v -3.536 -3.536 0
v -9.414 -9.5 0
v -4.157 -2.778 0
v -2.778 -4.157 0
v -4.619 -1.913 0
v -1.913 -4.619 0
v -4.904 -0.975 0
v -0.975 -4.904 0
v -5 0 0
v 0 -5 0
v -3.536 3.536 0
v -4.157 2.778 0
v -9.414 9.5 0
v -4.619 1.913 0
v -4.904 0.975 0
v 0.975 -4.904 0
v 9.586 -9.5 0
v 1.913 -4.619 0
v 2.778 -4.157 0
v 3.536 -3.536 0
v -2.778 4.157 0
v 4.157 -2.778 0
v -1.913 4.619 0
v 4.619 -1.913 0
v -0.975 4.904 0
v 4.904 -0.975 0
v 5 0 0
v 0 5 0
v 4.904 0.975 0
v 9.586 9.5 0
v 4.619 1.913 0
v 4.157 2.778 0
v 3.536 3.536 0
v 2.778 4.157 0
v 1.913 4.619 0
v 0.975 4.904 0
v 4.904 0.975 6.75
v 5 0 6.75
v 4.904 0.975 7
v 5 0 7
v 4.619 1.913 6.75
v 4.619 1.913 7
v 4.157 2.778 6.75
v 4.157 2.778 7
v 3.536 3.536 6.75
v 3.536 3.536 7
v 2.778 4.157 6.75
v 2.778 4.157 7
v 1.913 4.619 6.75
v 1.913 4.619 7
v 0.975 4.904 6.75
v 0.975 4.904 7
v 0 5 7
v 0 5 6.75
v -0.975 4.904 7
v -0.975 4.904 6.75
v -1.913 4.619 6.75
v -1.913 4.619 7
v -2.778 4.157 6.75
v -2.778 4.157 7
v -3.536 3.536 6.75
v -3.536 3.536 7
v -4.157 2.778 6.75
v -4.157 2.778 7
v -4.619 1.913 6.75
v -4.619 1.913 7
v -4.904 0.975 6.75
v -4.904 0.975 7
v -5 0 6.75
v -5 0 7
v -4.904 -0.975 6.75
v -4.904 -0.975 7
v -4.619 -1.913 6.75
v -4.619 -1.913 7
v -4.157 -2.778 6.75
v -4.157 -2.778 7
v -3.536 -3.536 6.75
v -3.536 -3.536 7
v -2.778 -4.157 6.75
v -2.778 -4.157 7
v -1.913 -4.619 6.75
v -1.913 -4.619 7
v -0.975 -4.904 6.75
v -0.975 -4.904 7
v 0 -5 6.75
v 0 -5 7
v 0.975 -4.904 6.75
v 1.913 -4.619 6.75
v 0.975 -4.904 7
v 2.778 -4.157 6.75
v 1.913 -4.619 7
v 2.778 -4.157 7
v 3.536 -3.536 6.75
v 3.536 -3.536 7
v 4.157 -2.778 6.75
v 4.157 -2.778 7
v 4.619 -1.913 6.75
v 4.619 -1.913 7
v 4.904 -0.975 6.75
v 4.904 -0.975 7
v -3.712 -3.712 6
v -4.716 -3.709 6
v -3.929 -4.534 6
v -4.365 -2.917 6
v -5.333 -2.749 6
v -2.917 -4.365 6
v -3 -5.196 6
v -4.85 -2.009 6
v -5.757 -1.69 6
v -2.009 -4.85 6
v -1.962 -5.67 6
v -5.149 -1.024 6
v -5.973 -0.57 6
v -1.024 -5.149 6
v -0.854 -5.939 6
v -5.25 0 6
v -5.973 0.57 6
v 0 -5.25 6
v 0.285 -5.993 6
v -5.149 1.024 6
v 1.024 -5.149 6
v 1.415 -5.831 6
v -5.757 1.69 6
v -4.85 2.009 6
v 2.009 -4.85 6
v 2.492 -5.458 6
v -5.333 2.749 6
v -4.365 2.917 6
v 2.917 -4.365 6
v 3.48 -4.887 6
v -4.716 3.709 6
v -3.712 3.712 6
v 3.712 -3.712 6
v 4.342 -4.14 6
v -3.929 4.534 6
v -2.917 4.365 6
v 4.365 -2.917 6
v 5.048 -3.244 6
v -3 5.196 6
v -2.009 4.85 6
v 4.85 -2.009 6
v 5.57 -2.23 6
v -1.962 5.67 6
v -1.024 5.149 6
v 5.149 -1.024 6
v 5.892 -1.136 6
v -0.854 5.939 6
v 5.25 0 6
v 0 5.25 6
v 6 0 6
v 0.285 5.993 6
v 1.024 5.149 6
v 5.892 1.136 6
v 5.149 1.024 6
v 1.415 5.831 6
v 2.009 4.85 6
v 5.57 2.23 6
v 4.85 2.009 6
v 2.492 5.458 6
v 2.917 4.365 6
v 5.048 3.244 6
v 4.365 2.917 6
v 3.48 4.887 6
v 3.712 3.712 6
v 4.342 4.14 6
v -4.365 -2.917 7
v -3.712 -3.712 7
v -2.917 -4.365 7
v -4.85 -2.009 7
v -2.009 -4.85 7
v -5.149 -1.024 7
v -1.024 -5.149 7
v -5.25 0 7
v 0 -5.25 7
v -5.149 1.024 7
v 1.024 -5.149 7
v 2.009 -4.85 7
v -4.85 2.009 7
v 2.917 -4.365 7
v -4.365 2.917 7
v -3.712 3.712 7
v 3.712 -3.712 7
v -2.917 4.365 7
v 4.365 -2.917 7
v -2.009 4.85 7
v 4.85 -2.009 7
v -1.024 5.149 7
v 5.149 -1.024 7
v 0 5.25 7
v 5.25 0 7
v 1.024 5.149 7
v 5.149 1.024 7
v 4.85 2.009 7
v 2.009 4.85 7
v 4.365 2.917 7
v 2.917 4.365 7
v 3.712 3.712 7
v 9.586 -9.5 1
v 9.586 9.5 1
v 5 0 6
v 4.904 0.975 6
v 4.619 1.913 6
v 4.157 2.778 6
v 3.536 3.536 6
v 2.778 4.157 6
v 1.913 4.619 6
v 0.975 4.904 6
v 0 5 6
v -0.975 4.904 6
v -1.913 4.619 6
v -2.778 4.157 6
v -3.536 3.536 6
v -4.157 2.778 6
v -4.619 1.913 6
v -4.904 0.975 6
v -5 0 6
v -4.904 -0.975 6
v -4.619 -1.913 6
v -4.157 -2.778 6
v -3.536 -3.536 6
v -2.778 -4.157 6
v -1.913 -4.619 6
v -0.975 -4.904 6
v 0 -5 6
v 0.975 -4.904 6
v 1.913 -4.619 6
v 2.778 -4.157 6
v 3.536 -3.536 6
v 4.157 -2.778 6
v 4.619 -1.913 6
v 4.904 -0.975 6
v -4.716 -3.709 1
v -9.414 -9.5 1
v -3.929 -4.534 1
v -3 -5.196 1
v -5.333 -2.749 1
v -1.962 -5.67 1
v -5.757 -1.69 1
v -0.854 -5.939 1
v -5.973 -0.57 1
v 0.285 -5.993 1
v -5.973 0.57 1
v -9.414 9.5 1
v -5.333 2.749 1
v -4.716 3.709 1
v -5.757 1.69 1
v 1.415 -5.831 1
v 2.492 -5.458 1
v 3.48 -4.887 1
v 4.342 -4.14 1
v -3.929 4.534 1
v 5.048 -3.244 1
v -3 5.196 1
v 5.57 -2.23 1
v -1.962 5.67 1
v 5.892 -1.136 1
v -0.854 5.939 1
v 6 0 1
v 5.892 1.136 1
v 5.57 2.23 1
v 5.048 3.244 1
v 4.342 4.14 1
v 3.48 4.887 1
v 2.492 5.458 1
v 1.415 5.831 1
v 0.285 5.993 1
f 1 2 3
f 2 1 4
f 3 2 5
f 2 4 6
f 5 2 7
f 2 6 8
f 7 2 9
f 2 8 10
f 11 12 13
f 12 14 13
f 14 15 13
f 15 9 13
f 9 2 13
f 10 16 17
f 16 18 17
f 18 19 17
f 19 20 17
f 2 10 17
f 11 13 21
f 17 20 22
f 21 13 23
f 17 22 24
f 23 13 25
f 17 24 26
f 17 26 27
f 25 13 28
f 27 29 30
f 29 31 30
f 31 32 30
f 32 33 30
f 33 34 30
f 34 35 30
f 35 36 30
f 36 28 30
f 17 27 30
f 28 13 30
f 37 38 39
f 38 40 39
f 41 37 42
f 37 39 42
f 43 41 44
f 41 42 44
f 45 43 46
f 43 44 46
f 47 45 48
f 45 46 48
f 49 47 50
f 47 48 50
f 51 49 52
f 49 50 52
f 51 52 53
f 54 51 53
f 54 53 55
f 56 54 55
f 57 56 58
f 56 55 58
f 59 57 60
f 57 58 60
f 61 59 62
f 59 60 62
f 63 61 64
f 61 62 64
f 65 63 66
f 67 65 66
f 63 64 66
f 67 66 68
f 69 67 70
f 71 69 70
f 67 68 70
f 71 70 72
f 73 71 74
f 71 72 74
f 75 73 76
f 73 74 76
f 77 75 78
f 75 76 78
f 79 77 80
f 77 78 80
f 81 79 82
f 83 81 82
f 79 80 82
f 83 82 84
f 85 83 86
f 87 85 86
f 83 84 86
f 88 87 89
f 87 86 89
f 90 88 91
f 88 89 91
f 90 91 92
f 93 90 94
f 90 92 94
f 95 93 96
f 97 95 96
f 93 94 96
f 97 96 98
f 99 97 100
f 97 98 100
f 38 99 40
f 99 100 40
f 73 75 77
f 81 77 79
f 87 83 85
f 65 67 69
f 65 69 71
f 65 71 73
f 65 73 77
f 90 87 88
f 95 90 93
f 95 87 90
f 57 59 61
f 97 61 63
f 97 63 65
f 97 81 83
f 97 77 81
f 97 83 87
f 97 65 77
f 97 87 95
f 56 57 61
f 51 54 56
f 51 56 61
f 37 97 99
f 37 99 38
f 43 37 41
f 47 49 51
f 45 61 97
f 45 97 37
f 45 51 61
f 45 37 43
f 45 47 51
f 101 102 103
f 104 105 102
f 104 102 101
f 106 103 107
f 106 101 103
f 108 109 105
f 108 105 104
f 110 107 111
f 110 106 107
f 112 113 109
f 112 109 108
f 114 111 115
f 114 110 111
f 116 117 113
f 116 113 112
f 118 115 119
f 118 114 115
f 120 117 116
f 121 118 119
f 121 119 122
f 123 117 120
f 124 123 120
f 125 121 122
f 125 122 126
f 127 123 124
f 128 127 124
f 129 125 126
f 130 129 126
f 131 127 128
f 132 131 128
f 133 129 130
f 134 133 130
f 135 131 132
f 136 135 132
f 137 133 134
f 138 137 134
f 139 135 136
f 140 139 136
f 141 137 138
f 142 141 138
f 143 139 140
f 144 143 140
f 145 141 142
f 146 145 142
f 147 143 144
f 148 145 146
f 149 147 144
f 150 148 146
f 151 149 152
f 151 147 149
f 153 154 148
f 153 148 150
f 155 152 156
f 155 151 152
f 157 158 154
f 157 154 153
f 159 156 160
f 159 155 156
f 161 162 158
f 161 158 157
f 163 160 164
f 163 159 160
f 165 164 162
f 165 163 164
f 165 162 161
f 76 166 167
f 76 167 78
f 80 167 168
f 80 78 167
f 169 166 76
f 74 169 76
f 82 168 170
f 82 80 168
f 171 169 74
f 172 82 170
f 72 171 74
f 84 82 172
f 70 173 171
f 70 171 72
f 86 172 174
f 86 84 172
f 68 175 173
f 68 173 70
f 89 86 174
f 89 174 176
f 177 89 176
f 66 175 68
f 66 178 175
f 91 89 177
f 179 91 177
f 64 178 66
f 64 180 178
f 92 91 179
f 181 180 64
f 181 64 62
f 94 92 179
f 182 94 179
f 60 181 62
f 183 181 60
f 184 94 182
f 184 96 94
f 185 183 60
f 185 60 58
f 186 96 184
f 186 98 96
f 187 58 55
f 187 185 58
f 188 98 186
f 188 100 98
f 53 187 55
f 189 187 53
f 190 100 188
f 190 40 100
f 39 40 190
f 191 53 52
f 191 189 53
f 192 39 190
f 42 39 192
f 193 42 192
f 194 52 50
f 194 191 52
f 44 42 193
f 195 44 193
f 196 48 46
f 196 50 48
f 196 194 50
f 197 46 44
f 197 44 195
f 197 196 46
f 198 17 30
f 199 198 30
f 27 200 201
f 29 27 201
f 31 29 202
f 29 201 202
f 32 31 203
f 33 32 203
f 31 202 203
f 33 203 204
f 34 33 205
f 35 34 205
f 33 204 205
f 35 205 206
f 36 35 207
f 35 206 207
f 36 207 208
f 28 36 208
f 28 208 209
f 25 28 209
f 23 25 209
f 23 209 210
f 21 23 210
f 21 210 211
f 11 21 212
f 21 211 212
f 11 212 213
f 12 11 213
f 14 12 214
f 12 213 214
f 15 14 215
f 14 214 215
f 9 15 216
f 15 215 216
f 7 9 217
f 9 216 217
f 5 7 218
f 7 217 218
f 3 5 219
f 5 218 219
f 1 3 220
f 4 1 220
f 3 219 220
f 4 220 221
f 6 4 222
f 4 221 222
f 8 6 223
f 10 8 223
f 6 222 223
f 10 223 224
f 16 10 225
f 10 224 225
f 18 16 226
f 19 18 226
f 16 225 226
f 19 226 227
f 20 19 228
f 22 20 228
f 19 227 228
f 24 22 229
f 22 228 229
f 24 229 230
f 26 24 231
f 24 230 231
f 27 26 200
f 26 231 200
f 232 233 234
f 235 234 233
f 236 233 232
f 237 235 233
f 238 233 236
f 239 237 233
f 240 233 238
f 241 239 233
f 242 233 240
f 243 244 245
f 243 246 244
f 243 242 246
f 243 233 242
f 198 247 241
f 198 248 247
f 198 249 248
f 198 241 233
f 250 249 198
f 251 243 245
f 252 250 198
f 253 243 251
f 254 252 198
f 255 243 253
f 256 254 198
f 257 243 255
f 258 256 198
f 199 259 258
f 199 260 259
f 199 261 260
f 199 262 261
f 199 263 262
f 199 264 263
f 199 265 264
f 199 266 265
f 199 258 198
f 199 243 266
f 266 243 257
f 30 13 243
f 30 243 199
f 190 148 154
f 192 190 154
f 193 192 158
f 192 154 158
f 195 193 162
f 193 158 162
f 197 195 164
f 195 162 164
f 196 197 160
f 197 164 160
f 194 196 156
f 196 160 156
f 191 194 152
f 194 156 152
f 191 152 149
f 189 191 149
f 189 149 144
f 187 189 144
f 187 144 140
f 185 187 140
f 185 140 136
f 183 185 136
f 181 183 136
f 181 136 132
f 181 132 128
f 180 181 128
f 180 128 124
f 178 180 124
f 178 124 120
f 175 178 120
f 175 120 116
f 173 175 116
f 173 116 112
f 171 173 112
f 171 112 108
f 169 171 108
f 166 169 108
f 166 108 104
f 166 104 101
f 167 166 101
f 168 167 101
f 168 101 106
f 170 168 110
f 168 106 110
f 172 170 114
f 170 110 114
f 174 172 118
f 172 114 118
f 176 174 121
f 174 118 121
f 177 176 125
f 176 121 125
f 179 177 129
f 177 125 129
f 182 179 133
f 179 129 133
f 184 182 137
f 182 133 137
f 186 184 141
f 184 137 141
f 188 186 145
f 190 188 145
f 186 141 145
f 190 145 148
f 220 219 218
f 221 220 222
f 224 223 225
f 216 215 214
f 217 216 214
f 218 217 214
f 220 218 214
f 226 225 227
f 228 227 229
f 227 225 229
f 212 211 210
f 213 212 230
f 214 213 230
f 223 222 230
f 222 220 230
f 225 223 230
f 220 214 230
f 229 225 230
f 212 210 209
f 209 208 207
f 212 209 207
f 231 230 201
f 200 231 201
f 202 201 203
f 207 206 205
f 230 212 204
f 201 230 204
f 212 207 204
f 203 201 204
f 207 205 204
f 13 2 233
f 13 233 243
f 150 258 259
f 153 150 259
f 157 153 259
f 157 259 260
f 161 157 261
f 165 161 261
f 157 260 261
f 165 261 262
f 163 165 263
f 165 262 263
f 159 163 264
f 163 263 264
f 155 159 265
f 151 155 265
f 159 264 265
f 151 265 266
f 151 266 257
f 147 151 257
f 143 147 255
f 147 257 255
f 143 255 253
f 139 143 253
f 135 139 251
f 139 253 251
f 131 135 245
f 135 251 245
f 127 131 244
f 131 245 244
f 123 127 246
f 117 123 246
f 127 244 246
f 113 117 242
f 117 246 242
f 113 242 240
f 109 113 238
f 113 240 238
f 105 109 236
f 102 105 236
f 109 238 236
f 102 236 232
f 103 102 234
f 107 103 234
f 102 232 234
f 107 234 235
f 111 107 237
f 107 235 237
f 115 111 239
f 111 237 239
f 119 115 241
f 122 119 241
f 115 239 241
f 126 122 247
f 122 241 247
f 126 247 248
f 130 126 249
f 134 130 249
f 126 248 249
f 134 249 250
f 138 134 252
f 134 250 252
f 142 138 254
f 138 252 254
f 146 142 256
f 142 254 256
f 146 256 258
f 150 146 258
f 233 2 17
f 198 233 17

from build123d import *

# Parameters (mm, degrees)
SKETCH1_W           = 19
SKETCH1_H           = 19
BOSS_EXTRUDE1_DEPTH = 1
SKETCH2_R           = 6
BOSS_EXTRUDE2_DEPTH = 5
SKETCH3_R           = 5.25
SKETCH3_R_2         = 5
BOSS_EXTRUDE5_DEPTH = 1
SKETCH6_R           = 5
CUT_EXTRUDE3_DEPTH  = 16.203073736
SKETCH7_R           = 5.25
BOSS_EXTRUDE6_DEPTH = 0.75


with BuildPart() as part:
    # Sketch1 → Boss-Extrude1 (new body)
    with BuildSketch(Plane.XY):
        with Locations((0.085585586, 0)):
            Rectangle(SKETCH1_W, SKETCH1_H)
    extrude(amount=BOSS_EXTRUDE1_DEPTH)

    # Sketch2 → Boss-Extrude2 (add)
    with BuildSketch(Plane.XY.offset(1)):
        Circle(SKETCH2_R)
    extrude(amount=BOSS_EXTRUDE2_DEPTH)

    # Sketch3 → Boss-Extrude5 (add)
    with BuildSketch(Plane.XY.offset(6)):
        Circle(SKETCH3_R)
        Circle(SKETCH3_R_2, mode=Mode.SUBTRACT)
    extrude(amount=BOSS_EXTRUDE5_DEPTH)

    # Sketch6 → Cut-Extrude3 (cut, through all)
    with BuildSketch(Plane.XY.offset(7)):
        Circle(SKETCH6_R)
    extrude(amount=-CUT_EXTRUDE3_DEPTH, mode=Mode.SUBTRACT)

    # Sketch7 → Boss-Extrude6 (add)
    with BuildSketch(Plane.XY.offset(6)):
        Circle(SKETCH7_R)
    extrude(amount=BOSS_EXTRUDE6_DEPTH)


solid = part.part
